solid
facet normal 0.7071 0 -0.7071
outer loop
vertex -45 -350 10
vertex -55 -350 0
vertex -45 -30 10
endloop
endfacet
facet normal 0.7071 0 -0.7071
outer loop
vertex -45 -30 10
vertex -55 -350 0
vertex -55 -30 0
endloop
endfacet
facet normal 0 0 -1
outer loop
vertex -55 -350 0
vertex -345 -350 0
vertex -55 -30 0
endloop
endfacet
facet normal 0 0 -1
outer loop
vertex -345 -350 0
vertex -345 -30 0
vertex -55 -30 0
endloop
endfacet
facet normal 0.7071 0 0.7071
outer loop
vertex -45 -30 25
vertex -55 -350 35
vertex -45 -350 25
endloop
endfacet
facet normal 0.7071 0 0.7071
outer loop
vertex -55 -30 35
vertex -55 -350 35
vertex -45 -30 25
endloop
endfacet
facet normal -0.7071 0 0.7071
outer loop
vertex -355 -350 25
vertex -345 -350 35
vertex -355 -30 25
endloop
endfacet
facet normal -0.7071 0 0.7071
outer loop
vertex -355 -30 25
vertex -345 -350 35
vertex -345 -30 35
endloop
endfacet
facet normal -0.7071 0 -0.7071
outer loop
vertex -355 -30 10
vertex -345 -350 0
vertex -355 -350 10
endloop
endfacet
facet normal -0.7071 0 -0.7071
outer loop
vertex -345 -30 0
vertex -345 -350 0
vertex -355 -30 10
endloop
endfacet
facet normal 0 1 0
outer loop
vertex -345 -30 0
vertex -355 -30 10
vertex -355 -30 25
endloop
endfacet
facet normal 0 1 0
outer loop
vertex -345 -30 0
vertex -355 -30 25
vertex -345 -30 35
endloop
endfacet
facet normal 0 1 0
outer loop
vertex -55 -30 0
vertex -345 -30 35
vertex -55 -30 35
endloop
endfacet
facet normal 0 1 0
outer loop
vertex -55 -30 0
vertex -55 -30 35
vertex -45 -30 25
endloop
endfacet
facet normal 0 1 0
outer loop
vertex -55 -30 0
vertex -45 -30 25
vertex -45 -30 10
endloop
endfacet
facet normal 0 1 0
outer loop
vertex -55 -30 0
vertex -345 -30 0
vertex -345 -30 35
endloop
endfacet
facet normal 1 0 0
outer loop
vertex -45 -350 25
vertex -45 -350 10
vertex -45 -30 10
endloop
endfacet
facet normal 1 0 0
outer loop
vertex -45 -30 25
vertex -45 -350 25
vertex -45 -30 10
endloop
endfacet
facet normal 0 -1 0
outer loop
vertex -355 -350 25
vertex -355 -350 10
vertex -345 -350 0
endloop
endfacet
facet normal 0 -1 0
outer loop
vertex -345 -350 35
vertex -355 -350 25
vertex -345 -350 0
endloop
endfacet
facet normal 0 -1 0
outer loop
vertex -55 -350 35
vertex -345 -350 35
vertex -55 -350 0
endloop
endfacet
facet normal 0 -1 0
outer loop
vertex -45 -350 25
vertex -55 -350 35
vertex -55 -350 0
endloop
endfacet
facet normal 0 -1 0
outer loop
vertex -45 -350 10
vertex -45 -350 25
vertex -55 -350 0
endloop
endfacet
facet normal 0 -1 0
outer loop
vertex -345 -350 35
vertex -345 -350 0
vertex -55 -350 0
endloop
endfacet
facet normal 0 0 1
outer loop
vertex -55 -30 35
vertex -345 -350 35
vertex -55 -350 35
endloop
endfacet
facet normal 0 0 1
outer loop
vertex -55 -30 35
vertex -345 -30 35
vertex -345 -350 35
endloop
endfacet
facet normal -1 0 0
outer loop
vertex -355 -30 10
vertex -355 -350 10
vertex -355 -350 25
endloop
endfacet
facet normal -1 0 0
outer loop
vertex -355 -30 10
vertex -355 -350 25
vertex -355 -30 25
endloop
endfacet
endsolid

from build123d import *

# Parameters (mm, degrees)
ESBO_O1_W                = 310
ESBO_O1_H                = 320
RESSALTO_EXTRUS_O1_DEPTH = 35
CHANFRO1_SIZE            = 10


with BuildPart() as part:
    # Esboço1 → Ressalto-extrusão1 (new body)
    with BuildSketch(Plane.XY):
        with Locations((-200, -190)):
            Rectangle(ESBO_O1_W, ESBO_O1_H)
    extrude(amount=RESSALTO_EXTRUS_O1_DEPTH)

    # Chanfro1
    chanfro1_edges = [part.edges().sort_by_distance(p)[0] for p in [
        (-355, -190, 35),
        (-45, -190, 35),
        (-355, -190, 0),
        (-45, -190, 0),
    ]]
    chamfer(chanfro1_edges, length=CHANFRO1_SIZE)


solid = part.part
